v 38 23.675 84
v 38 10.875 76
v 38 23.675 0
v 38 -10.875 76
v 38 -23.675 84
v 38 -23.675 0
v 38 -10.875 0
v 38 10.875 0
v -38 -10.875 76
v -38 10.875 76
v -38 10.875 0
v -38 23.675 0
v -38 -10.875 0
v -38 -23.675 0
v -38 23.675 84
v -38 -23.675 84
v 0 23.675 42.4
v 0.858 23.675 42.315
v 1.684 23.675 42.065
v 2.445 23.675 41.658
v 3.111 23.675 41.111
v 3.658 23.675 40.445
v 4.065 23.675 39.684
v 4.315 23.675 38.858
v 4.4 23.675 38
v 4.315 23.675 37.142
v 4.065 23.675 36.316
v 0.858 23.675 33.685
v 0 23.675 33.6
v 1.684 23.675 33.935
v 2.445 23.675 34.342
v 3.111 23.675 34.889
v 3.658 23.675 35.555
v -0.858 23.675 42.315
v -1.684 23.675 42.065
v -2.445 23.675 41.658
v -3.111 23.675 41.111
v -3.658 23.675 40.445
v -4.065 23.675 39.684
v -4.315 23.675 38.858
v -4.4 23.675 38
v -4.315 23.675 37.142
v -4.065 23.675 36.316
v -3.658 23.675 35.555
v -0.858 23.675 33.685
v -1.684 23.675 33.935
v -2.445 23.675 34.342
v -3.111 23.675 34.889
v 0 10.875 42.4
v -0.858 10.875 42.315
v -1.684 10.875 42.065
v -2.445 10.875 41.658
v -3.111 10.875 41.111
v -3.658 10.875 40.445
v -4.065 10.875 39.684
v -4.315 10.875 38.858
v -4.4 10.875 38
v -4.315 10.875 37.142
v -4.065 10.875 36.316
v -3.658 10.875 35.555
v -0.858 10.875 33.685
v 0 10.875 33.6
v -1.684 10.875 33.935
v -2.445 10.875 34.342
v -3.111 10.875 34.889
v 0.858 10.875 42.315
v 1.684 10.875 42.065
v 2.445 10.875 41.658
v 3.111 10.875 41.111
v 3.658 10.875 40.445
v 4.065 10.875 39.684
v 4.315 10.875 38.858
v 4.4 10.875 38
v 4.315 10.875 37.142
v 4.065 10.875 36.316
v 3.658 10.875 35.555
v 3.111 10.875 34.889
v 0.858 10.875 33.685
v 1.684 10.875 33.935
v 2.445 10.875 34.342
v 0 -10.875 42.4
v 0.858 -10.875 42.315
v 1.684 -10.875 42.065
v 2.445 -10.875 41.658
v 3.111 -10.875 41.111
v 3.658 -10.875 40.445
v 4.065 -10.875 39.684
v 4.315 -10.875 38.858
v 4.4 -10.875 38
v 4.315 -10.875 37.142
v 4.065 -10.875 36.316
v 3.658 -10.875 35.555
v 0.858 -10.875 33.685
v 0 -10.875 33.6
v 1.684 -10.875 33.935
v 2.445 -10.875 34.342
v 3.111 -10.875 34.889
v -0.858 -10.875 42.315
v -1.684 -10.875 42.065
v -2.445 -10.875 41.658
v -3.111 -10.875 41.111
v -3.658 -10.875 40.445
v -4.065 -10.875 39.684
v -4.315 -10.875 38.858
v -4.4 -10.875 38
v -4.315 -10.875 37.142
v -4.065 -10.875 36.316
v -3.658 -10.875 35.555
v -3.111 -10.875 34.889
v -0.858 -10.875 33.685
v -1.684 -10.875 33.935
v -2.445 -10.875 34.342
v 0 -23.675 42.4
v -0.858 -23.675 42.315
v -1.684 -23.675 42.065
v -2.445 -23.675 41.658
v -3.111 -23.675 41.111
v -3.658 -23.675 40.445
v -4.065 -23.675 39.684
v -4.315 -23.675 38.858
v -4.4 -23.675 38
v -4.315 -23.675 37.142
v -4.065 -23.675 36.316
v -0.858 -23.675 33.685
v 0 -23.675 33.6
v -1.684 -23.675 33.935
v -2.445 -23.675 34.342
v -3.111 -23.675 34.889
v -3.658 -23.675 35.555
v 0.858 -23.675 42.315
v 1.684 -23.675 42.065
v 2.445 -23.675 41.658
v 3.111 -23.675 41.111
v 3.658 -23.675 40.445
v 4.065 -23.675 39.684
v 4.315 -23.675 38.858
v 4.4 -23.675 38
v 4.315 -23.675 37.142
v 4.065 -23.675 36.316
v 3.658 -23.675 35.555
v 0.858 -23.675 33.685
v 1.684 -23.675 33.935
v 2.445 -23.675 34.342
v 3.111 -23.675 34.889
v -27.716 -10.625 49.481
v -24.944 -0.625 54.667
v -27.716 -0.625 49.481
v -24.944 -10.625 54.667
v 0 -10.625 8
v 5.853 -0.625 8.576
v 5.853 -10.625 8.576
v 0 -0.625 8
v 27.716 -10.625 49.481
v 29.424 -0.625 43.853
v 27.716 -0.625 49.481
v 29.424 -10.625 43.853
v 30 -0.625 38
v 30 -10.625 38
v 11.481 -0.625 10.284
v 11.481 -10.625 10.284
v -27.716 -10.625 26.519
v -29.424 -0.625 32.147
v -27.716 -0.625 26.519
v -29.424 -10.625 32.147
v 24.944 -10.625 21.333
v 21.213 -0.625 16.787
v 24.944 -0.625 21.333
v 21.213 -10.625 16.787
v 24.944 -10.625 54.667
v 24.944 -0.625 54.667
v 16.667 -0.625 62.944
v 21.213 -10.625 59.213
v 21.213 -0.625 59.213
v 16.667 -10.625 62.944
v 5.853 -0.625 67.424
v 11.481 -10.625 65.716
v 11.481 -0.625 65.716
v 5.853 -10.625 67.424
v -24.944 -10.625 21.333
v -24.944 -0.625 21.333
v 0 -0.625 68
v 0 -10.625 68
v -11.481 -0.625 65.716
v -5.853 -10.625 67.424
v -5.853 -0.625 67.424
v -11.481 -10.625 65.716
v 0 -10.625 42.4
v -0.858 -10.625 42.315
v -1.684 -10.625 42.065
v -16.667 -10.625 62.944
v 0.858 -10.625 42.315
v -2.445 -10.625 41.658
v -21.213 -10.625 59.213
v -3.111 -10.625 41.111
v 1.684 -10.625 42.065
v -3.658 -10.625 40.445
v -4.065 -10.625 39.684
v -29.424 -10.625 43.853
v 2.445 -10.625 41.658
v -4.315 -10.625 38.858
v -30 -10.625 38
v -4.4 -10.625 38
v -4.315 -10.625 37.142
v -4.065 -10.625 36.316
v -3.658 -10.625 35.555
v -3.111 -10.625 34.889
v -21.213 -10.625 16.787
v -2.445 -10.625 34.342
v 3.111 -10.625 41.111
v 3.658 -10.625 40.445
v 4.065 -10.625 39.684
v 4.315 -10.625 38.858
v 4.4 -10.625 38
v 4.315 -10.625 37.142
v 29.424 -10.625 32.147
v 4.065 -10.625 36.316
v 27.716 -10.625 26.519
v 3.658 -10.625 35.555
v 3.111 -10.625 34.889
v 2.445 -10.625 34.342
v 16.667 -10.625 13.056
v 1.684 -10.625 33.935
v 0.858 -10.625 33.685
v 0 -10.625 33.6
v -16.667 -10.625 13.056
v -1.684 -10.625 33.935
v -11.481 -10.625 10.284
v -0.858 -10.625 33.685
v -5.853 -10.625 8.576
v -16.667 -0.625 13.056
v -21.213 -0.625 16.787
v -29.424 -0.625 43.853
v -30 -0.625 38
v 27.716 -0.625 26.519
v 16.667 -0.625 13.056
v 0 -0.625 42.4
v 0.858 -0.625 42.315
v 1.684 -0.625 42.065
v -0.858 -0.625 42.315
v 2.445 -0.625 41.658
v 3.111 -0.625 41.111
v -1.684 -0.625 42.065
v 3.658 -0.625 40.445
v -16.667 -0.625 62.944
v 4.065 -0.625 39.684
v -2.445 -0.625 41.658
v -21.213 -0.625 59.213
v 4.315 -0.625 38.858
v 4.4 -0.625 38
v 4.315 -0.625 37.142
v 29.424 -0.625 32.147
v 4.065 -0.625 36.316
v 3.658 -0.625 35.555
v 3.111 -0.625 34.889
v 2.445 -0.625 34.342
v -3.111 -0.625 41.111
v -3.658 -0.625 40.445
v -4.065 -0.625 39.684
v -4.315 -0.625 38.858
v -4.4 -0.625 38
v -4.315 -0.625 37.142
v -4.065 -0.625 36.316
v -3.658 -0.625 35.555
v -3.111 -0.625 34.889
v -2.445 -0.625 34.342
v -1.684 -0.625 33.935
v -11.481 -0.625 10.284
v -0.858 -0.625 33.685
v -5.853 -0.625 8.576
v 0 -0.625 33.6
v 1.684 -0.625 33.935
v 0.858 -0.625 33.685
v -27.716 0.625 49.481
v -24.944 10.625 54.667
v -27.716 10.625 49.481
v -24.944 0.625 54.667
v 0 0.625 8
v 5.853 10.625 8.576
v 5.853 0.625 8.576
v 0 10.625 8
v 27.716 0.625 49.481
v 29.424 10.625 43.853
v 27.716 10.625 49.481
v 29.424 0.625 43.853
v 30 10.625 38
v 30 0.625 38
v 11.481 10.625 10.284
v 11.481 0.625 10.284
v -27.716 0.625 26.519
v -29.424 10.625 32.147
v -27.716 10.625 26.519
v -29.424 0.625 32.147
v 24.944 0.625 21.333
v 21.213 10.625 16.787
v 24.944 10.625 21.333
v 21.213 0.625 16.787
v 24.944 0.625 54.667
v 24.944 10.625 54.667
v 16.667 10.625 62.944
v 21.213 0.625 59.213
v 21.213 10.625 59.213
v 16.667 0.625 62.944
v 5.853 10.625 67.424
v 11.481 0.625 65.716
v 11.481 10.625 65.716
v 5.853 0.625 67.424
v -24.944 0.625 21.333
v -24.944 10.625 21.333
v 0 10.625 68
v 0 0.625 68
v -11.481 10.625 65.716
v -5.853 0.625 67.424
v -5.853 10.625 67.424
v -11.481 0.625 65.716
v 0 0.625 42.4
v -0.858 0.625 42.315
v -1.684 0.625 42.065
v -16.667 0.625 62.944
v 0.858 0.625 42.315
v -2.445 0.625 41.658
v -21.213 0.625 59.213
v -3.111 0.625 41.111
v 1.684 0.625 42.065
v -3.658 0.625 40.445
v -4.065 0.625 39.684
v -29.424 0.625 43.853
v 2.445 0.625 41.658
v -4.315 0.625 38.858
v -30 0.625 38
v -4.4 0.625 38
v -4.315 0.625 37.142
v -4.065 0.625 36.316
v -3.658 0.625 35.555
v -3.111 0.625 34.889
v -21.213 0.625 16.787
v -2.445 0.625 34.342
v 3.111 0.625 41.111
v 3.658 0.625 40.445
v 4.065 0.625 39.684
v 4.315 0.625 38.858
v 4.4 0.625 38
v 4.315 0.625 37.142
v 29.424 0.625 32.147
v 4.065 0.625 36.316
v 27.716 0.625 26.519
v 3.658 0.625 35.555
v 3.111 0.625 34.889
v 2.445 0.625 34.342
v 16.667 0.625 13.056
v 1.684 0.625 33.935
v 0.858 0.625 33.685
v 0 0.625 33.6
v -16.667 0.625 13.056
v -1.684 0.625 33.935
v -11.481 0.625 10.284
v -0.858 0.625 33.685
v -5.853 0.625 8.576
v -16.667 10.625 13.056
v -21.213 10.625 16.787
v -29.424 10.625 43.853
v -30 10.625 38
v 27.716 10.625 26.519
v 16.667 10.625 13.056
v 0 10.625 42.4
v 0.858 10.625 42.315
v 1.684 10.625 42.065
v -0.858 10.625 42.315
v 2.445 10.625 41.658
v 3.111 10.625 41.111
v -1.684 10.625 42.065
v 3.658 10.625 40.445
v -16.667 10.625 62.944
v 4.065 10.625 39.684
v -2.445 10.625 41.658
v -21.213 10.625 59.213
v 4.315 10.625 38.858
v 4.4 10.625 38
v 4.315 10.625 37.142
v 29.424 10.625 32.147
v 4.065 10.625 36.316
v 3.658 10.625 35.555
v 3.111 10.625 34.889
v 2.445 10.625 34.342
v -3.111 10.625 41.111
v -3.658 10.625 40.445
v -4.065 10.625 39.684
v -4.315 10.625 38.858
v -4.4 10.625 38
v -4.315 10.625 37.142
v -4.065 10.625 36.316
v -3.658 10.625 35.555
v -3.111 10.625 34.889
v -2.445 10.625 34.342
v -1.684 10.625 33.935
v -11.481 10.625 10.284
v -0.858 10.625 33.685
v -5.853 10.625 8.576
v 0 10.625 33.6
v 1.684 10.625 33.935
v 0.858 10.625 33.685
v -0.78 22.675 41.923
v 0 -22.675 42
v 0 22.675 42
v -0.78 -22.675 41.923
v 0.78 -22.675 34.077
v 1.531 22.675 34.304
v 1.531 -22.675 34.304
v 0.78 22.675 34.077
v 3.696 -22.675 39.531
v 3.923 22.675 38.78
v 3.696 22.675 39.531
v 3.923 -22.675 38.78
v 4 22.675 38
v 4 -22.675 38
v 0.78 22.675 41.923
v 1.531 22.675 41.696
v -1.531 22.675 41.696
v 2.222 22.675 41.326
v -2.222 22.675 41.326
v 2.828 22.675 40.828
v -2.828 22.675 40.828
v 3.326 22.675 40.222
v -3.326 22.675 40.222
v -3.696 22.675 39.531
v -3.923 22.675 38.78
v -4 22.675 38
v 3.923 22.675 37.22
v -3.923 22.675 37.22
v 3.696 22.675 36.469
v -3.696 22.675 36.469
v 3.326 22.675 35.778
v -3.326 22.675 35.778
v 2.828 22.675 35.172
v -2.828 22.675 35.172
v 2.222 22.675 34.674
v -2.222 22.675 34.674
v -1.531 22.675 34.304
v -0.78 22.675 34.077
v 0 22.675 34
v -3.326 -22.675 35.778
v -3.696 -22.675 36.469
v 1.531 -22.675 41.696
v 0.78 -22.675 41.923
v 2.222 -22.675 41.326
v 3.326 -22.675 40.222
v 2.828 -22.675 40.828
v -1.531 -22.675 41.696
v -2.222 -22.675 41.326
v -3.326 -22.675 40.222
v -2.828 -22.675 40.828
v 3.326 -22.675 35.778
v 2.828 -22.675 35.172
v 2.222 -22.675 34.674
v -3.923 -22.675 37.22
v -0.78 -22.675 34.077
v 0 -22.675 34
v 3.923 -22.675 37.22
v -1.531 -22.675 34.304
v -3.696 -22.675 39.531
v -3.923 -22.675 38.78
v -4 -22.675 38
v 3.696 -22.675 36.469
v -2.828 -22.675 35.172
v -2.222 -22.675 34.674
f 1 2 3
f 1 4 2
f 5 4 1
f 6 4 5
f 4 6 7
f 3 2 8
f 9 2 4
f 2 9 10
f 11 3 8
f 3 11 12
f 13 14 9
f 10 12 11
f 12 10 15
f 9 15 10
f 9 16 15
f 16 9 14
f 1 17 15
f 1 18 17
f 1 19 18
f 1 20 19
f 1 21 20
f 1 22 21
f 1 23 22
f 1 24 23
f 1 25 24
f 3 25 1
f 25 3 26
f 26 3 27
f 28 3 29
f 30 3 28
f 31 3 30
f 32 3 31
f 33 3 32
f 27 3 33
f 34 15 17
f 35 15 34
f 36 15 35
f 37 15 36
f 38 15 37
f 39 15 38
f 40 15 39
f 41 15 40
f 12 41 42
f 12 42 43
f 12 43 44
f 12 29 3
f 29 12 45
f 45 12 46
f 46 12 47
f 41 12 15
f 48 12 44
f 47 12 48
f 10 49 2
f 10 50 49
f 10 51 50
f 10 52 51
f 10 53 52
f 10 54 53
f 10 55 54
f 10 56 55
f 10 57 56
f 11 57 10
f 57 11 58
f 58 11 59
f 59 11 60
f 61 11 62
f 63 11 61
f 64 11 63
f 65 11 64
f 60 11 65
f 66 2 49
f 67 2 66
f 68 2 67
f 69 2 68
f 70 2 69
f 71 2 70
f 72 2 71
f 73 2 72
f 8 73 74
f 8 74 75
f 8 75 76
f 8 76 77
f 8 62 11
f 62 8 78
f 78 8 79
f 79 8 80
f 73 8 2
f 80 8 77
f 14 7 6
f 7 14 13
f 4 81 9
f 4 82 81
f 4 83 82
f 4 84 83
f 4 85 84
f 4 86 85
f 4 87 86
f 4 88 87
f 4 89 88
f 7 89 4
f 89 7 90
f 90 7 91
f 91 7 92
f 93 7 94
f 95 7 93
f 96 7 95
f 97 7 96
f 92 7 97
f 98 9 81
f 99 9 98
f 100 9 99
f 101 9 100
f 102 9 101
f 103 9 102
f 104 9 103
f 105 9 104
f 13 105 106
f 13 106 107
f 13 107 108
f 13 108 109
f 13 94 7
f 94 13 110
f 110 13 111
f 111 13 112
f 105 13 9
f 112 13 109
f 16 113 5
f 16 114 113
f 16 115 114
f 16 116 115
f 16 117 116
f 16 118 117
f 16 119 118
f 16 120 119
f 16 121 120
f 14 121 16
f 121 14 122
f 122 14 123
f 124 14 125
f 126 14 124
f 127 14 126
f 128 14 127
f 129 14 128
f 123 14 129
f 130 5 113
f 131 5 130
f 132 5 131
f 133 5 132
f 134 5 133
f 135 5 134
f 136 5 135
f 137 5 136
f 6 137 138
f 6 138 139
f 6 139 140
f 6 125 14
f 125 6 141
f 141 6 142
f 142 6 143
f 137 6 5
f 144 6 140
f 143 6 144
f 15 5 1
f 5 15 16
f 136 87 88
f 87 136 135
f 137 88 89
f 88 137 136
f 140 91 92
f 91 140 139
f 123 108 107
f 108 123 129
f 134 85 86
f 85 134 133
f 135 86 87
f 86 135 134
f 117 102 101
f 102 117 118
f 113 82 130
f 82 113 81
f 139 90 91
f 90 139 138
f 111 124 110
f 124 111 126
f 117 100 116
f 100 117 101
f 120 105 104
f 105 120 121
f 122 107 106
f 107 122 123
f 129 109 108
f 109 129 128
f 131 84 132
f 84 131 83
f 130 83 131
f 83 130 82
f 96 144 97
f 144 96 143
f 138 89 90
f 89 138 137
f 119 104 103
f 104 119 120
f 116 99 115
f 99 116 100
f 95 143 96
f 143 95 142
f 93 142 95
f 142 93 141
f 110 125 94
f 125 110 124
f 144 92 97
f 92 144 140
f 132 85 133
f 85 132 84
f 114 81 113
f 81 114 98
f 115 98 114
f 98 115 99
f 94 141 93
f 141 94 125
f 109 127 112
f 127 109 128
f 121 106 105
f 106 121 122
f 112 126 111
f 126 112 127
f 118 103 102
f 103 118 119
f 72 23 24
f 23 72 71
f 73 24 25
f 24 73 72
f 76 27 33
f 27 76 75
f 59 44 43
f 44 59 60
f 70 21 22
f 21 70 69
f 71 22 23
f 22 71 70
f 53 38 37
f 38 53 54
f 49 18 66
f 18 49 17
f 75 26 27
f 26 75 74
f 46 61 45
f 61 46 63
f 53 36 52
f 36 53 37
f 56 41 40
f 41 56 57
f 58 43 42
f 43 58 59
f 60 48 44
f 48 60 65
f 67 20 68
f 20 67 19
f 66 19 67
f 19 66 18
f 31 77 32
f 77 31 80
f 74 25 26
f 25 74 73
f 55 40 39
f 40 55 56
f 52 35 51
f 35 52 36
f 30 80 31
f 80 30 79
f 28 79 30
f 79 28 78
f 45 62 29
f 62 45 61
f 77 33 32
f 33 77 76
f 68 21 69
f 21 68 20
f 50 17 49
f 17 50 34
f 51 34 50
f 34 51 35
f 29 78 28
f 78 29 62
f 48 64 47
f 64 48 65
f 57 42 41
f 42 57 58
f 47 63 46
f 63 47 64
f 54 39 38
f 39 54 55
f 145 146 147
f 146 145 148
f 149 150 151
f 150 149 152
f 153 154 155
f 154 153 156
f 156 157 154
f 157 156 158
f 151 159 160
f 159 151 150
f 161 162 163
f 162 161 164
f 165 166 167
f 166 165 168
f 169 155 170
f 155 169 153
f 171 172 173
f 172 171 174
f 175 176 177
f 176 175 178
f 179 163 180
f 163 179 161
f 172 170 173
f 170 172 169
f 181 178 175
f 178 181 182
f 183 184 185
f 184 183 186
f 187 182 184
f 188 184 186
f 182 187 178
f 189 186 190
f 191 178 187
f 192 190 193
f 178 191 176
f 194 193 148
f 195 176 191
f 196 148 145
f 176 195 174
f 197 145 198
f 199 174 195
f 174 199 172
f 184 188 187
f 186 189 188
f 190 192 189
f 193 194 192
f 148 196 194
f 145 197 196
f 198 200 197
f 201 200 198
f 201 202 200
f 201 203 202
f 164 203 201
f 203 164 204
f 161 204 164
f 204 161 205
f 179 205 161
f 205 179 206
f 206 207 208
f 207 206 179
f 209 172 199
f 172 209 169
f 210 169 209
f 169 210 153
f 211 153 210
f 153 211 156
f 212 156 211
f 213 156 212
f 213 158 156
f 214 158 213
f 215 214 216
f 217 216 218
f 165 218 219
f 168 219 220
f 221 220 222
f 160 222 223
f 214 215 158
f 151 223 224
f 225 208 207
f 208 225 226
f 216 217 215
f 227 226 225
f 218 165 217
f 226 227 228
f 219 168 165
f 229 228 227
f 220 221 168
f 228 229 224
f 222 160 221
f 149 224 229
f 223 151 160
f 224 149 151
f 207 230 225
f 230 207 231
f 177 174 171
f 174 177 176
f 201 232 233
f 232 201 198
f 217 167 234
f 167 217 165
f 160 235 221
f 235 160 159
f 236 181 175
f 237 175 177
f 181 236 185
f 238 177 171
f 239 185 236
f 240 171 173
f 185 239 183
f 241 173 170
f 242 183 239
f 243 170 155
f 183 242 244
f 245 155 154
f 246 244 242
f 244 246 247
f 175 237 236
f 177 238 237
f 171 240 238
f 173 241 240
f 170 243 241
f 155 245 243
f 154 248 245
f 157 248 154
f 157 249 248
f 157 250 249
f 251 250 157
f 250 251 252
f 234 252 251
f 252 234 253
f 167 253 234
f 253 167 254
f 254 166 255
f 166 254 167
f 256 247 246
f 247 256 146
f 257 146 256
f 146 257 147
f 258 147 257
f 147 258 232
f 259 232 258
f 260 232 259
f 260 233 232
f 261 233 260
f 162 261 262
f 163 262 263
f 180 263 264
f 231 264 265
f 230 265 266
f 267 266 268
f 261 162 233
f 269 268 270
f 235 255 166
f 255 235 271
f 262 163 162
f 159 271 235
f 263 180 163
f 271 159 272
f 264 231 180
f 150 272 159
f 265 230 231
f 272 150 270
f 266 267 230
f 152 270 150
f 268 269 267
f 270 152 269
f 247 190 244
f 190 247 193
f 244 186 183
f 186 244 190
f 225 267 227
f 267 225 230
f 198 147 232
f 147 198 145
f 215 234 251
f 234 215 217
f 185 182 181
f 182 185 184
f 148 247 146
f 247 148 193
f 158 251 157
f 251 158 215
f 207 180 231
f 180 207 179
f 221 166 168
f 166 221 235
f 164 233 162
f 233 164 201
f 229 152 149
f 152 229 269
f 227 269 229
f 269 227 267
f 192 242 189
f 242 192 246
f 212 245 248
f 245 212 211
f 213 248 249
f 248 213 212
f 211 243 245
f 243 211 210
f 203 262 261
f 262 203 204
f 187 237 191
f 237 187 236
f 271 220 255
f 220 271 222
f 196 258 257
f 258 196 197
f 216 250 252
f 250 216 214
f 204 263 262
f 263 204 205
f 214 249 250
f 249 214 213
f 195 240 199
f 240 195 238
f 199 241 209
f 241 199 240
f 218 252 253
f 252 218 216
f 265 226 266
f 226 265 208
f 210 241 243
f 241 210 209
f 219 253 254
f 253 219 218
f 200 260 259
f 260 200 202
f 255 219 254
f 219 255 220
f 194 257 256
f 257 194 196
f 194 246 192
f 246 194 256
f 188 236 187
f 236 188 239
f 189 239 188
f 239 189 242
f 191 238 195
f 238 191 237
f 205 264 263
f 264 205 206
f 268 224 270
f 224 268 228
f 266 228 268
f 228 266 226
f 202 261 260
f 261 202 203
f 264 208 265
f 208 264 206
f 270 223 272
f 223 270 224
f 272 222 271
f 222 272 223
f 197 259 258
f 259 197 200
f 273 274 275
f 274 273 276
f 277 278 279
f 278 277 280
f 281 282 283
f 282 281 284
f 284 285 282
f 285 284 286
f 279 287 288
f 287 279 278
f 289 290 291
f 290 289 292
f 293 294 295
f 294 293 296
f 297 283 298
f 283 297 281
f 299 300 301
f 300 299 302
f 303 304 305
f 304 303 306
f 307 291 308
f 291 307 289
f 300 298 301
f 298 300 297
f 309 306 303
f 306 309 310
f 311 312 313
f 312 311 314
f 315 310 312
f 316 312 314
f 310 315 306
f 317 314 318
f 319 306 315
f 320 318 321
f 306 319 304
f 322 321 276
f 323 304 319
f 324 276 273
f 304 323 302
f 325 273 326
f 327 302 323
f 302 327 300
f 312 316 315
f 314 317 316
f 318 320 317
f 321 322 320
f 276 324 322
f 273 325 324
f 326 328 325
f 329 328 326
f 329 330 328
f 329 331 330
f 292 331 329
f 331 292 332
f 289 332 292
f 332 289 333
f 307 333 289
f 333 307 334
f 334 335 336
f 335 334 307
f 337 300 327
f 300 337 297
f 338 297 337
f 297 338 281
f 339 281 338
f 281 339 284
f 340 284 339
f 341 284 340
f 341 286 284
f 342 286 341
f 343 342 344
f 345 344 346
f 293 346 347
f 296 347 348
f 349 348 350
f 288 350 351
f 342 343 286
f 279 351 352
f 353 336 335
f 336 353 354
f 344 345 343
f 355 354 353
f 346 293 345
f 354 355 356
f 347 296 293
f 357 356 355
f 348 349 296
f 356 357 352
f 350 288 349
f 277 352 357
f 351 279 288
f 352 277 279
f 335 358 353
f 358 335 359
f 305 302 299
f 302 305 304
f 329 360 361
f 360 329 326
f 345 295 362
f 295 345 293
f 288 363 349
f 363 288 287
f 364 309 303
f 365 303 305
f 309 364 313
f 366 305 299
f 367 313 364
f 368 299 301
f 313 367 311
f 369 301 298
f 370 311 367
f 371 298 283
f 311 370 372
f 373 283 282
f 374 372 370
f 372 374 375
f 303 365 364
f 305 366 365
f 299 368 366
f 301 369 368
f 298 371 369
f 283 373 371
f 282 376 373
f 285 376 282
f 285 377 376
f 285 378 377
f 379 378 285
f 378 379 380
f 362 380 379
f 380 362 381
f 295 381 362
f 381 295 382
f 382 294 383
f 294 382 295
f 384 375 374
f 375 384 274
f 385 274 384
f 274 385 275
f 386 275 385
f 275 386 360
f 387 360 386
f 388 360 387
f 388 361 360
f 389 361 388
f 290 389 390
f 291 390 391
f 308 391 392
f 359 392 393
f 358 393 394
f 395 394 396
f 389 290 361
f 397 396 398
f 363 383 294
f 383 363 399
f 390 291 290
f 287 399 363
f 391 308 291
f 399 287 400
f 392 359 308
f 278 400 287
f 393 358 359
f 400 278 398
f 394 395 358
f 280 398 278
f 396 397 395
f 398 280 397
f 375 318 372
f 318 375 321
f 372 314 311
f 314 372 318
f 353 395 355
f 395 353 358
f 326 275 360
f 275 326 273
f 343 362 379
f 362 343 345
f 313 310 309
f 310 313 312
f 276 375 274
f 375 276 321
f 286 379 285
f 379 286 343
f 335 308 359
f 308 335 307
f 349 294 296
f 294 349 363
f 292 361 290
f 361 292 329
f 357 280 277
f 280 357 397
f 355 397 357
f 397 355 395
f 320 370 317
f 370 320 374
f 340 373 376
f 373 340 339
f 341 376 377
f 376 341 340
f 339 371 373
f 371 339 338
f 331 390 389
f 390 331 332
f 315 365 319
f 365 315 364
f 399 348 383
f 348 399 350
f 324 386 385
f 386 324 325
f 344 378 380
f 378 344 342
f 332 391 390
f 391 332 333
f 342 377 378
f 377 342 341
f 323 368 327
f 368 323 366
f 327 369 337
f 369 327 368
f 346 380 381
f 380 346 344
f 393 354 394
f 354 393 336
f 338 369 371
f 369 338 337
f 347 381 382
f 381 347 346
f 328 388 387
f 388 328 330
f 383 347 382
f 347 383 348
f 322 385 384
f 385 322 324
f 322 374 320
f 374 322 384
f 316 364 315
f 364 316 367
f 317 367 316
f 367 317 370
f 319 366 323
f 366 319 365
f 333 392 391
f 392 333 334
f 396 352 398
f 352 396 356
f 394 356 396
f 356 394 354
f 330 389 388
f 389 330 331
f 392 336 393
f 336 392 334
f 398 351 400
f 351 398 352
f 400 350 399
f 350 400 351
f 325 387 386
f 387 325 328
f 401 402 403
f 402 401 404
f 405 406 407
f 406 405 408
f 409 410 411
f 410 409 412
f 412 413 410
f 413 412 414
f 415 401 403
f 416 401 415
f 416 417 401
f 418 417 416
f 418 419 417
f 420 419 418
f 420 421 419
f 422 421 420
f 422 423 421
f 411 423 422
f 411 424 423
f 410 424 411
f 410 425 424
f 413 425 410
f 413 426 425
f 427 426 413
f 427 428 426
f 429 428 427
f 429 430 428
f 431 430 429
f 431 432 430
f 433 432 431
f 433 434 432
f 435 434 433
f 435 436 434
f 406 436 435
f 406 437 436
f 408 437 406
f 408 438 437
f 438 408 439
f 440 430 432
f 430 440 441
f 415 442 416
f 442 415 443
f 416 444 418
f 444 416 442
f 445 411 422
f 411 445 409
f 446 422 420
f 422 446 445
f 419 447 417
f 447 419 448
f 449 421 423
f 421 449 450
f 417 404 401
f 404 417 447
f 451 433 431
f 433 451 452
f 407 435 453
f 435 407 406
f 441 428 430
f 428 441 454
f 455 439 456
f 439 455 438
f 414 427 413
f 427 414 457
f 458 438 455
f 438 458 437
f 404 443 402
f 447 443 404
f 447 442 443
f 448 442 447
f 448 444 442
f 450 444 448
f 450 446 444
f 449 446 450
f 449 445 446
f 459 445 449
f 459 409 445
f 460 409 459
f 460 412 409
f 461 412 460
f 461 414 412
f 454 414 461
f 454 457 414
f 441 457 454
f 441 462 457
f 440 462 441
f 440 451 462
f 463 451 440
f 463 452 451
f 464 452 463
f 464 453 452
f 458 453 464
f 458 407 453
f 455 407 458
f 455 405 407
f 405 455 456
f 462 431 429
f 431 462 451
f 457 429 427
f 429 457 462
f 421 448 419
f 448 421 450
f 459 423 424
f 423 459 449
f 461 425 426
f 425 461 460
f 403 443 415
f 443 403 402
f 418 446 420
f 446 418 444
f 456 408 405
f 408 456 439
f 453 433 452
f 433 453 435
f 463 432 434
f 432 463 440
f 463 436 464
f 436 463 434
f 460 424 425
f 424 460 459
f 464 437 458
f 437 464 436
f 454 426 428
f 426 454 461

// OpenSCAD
$fn = 32;

// ------------------------------------------------------------------------
// Trolley wheel set: wheels d60, fork 76 mm tall
// Every part is its own module, assembly() places every instance.
// ------------------------------------------------------------------------

// --- part 1 ---
module trolley_fork() {
  difference() {
    union() {
      translate([-38, 10.875, 0]) cube([76, 12.8, 76]);
      translate([-38, -23.675, 0]) cube([76, 12.8, 76]);
      translate([-38, -23.675, 76]) cube([76, 47.35, 8]);
    }
    translate([0, -17.275, 38]) rotate([90, 0, 0]) cylinder(h = 14.8, d = 8.8, center = true);
    translate([0, 17.275, 38]) rotate([90, 0, 0]) cylinder(h = 14.8, d = 8.8, center = true);
  }
}

// --- part 2 ---
module trolley_wheel() {
  difference() {
      translate([0, 0, 0]) cylinder(h = 10, d = 60);
      translate([0, 0, -1]) cylinder(h = 12, d = 8.8);
    }
}

// --- part 3 ---
module trolley_axle() {
  translate([0, 0, -22.675]) cylinder(h = 45.35, d = 8);
}

// --- assembly ---
module assembly() {
  color([0.80, 0.24, 0.20]) translate([0, 0, 0]) rotate([0, 0, 0]) trolley_fork();
  color([0.20, 0.45, 0.75]) translate([0, -0.625, 38]) rotate([90, 0, 0]) trolley_wheel();
  color([0.25, 0.62, 0.32]) translate([0, 10.625, 38]) rotate([90, 0, 0]) trolley_wheel();
  color([0.92, 0.70, 0.18]) translate([0, 0, 38]) rotate([90, 0, 0]) trolley_axle();
}

assembly();
